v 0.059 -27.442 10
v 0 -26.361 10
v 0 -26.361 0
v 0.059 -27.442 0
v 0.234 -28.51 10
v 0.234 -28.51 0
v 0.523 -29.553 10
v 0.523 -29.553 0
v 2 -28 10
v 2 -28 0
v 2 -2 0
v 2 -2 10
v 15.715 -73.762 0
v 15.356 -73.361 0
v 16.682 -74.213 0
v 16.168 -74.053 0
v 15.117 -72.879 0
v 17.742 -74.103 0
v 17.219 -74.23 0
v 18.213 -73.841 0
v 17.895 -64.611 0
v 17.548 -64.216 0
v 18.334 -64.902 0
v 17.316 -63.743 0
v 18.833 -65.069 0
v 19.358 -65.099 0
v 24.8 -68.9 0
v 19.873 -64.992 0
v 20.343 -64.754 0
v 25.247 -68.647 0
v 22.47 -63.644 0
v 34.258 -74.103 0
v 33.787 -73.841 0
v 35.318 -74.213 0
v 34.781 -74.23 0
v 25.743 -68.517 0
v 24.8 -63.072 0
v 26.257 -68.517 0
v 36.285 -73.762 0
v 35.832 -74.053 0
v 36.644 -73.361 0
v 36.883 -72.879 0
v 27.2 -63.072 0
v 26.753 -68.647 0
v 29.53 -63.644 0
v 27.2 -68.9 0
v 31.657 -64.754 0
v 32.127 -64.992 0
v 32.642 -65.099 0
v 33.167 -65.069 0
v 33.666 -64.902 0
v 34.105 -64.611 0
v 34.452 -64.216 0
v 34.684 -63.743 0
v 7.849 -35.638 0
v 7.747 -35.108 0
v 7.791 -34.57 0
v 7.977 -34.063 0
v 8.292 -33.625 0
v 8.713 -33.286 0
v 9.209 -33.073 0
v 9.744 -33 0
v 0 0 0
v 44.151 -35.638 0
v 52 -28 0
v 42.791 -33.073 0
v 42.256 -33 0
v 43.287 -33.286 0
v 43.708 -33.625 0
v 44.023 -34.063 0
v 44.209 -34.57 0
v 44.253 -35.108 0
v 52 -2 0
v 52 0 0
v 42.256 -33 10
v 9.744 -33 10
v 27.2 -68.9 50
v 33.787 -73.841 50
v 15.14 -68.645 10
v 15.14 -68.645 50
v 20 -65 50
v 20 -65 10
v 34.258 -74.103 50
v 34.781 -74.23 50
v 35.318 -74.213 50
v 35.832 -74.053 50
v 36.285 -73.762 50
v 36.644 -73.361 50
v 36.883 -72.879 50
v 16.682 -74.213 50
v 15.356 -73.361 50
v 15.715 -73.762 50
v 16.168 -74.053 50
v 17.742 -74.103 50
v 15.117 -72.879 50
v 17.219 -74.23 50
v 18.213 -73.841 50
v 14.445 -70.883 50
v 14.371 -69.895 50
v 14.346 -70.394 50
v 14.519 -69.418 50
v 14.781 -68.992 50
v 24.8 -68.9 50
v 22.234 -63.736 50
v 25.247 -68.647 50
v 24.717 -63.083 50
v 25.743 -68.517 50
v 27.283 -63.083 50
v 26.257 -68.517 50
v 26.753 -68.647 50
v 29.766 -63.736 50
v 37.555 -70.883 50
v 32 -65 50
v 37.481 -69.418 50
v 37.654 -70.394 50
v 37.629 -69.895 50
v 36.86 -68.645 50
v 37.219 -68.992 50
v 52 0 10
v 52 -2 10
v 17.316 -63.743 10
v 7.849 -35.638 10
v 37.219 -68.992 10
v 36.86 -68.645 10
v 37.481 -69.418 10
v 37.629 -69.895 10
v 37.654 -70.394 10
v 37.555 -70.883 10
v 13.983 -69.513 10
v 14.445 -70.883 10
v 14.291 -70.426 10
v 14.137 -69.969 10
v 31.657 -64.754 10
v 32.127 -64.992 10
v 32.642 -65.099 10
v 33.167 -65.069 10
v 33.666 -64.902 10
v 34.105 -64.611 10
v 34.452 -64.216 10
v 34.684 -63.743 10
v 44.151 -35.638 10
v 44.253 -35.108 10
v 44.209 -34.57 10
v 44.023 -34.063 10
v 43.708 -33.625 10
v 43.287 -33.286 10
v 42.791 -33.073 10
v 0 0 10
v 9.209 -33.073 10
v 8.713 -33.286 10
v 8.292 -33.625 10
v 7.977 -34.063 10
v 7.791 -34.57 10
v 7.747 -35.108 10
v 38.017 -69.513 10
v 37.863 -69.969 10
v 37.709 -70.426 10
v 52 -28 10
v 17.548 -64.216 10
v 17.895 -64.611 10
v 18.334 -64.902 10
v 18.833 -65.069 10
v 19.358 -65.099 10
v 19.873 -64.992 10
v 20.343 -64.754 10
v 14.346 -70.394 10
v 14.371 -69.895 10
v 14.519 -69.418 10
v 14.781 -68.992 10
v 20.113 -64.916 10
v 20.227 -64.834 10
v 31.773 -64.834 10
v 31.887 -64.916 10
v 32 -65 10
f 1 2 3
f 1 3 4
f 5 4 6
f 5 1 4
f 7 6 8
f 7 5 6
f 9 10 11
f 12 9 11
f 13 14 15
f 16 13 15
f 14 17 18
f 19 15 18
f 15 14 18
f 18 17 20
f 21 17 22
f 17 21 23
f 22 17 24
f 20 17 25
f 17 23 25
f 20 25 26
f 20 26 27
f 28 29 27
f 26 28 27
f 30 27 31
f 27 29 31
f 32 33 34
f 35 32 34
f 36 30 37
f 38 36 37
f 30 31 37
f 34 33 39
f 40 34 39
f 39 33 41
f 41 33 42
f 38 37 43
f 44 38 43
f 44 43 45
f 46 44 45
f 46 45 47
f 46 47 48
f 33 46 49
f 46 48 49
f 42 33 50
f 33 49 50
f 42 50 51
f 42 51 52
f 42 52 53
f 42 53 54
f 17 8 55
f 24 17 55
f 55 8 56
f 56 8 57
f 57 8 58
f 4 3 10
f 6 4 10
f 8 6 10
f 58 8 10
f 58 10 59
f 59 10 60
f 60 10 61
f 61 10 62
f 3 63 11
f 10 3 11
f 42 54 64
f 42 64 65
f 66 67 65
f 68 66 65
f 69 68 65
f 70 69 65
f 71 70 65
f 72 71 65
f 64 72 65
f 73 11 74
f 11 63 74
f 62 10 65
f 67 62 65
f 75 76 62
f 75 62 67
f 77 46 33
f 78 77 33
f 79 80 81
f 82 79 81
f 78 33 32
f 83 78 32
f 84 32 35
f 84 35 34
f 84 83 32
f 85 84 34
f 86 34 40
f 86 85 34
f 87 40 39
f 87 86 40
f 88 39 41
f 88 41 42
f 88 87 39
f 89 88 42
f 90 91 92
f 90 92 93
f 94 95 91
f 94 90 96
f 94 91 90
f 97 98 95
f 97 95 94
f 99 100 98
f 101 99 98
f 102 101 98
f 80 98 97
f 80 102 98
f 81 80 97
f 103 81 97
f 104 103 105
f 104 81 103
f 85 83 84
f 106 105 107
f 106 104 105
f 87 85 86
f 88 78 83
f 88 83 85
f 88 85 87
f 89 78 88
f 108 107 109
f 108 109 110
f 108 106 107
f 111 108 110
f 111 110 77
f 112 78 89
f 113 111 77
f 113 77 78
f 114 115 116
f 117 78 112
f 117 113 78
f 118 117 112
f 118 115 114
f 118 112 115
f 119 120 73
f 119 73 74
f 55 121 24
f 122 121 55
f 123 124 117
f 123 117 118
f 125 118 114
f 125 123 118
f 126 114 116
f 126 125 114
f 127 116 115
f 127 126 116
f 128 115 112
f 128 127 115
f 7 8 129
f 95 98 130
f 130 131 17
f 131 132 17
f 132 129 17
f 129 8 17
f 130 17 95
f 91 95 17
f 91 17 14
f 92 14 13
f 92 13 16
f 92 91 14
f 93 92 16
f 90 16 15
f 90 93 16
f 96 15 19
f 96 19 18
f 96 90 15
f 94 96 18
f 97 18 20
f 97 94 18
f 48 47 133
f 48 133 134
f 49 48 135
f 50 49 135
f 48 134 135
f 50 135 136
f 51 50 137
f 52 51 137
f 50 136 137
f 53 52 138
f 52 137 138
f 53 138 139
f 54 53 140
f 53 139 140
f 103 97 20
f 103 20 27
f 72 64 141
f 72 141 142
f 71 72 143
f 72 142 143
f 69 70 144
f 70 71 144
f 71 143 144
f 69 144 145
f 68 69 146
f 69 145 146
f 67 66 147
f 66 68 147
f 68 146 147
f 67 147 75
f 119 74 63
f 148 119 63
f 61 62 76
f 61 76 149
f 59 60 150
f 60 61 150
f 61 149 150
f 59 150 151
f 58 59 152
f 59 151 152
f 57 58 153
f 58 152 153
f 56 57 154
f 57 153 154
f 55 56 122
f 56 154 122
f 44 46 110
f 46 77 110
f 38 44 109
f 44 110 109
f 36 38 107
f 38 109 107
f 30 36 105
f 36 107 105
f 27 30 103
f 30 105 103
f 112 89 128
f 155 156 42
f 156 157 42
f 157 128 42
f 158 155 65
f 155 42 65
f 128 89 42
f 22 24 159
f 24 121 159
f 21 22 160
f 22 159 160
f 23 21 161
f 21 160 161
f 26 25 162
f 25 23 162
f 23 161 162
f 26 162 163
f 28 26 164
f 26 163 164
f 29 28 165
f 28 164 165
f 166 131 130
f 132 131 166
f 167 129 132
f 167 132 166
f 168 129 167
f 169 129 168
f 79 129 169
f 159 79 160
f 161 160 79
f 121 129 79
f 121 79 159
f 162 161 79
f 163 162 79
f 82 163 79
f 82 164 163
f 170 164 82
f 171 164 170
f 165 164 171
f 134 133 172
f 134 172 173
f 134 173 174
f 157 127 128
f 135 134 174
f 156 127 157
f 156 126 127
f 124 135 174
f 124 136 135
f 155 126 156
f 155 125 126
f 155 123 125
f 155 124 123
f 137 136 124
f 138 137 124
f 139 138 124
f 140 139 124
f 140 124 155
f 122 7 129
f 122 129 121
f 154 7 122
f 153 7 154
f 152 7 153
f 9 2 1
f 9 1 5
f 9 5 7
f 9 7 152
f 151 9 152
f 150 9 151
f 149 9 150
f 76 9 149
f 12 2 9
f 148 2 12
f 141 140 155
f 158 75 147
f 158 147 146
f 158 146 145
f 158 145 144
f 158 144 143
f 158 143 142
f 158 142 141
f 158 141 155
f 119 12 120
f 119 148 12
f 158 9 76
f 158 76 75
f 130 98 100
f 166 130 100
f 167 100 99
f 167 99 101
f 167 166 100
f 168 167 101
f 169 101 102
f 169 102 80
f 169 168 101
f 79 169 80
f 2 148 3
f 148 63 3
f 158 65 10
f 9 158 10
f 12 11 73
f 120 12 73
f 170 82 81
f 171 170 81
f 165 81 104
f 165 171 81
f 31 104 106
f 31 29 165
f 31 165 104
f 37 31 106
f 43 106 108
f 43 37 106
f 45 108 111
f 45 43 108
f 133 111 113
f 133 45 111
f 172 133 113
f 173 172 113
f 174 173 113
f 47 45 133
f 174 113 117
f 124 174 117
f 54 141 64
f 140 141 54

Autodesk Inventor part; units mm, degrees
ref_plane "YZ Plane" through (0, 0, 0) normal (1, 0, 0) x (0, 1, 0)
ref_plane "XZ Plane" through (0, 0, 0) normal (0, 1, 0) x (-1, 0, 0)
ref_plane "XY Plane" through (0, 0, 0) normal (0, 0, 1) x (1, 0, 0)
sketch "Sketch1" plane through (0, 0, 0) normal (0, 0, 1) x (1, 0, 0)
  line L0 (52, 0) -> (0, 0)
  line L1 (0, 0) -> (0, -28)
  line L2 (52, -28) -> (2, -28)
  line L3 (2, -28) -> (2, -2)
  line L4 (2, -2) -> (52, -2)
  line L5 (52, -2) -> (52, 0)
  line L6 (0, -28) -> (16, -75.5)
  line L7 (16, -75.5) -> (26, -68)
  line L8 (26, -68) -> (36, -75.5)
  line L9 (36, -75.5) -> (52, -28)
  line L10 (26, -68) -> (26, -56.7382) construction
  dimension "d1" = 50
  dimension "d2" = 2
  dimension "d3" = 2
  dimension "d4" = 26
  dimension "d6" = 40
  dimension "d7" = 20
  dimension "d8" = 7.5
extrude "Extrusion1" add sketch "Sketch1" along normal blind 10
sketch "Sketch2" plane through (0, 0, 10) normal (0, 0, 1) x (1, 0, 0)
  line L0 (16, -75.5) -> (26, -68) projected
  line L1 (26, -68) -> (36, -75.5) projected
  line L2 (26, -60.5) -> (38.0168, -69.5126)
  line L3 (52, -28) -> (36, -75.5) projected
  line L4 (36, -75.5) -> (38.0168, -69.5126)
  line L5 (26, -60.5) -> (13.9832, -69.5126)
  line L6 (0, -28) -> (16, -75.5) projected
  point P0 (0, 0)
  dimension "d13" = 6
extrude "Extrusion2" add sketch "Sketch2" along normal blind 40
sketch "Sketch3" plane through (0, 0, 10) normal (0, 0, 1) x (1, 0, 0)
  line L0 (26, -60.5) -> (38.0168, -69.5126) projected
  line L1 (38.0168, -69.5126) -> (52, -28) projected
  line L2 (52, -28) -> (2, -28) projected
  line L3 (2, -28) -> (2, -2) projected
  line L4 (2, -2) -> (52, -2) projected
  line L5 (52, -2) -> (52, 0) projected
  line L6 (52, 0) -> (0, 0) projected
  line L7 (0, 0) -> (0, -28) projected
  line L8 (0, -28) -> (13.9832, -69.5126) projected
  line L9 (13.9832, -69.5126) -> (26, -60.5) projected
  line L10 (6.9602, -33) -> (45.0398, -33)
  line L11 (45.0398, -33) -> (33.8048, -66.3536)
  line L12 (33.8048, -66.3536) -> (26, -60.5)
  line L13 (26, -60.5) -> (18.1952, -66.3536)
  line L14 (18.1952, -66.3536) -> (6.9602, -33)
  line L15 (52, -28) -> (2, -28) projected
  line L16 (38.0168, -69.5126) -> (52, -28) projected
  line L17 (0, -28) -> (13.9832, -69.5126) projected
  dimension "d14" = 5
  dimension "d15" = 5
  dimension "d16" = 5
  dimension "d17" = 0
  dimension "d18" = 0
extrude "Extrusion3" cut sketch "Sketch3" against normal blind 40 contours L9 L14 L10 L11 L0
fillet "Fillet1" radius 10 2 edges at (0, -28, 5) (26, -60.5, 25)
fillet "Fillet2" radius 2 9 edges at (13.9832, -69.5126, 30) (16, -75.5, 25) (36, -75.5, 25) (26, -68, 25) (45.0398, -33, 5) (6.9602, -33, 5) (33.8048, -66.3536, 5) (18.1952, -66.3536, 5) (38.0168, -69.5126, 30)
